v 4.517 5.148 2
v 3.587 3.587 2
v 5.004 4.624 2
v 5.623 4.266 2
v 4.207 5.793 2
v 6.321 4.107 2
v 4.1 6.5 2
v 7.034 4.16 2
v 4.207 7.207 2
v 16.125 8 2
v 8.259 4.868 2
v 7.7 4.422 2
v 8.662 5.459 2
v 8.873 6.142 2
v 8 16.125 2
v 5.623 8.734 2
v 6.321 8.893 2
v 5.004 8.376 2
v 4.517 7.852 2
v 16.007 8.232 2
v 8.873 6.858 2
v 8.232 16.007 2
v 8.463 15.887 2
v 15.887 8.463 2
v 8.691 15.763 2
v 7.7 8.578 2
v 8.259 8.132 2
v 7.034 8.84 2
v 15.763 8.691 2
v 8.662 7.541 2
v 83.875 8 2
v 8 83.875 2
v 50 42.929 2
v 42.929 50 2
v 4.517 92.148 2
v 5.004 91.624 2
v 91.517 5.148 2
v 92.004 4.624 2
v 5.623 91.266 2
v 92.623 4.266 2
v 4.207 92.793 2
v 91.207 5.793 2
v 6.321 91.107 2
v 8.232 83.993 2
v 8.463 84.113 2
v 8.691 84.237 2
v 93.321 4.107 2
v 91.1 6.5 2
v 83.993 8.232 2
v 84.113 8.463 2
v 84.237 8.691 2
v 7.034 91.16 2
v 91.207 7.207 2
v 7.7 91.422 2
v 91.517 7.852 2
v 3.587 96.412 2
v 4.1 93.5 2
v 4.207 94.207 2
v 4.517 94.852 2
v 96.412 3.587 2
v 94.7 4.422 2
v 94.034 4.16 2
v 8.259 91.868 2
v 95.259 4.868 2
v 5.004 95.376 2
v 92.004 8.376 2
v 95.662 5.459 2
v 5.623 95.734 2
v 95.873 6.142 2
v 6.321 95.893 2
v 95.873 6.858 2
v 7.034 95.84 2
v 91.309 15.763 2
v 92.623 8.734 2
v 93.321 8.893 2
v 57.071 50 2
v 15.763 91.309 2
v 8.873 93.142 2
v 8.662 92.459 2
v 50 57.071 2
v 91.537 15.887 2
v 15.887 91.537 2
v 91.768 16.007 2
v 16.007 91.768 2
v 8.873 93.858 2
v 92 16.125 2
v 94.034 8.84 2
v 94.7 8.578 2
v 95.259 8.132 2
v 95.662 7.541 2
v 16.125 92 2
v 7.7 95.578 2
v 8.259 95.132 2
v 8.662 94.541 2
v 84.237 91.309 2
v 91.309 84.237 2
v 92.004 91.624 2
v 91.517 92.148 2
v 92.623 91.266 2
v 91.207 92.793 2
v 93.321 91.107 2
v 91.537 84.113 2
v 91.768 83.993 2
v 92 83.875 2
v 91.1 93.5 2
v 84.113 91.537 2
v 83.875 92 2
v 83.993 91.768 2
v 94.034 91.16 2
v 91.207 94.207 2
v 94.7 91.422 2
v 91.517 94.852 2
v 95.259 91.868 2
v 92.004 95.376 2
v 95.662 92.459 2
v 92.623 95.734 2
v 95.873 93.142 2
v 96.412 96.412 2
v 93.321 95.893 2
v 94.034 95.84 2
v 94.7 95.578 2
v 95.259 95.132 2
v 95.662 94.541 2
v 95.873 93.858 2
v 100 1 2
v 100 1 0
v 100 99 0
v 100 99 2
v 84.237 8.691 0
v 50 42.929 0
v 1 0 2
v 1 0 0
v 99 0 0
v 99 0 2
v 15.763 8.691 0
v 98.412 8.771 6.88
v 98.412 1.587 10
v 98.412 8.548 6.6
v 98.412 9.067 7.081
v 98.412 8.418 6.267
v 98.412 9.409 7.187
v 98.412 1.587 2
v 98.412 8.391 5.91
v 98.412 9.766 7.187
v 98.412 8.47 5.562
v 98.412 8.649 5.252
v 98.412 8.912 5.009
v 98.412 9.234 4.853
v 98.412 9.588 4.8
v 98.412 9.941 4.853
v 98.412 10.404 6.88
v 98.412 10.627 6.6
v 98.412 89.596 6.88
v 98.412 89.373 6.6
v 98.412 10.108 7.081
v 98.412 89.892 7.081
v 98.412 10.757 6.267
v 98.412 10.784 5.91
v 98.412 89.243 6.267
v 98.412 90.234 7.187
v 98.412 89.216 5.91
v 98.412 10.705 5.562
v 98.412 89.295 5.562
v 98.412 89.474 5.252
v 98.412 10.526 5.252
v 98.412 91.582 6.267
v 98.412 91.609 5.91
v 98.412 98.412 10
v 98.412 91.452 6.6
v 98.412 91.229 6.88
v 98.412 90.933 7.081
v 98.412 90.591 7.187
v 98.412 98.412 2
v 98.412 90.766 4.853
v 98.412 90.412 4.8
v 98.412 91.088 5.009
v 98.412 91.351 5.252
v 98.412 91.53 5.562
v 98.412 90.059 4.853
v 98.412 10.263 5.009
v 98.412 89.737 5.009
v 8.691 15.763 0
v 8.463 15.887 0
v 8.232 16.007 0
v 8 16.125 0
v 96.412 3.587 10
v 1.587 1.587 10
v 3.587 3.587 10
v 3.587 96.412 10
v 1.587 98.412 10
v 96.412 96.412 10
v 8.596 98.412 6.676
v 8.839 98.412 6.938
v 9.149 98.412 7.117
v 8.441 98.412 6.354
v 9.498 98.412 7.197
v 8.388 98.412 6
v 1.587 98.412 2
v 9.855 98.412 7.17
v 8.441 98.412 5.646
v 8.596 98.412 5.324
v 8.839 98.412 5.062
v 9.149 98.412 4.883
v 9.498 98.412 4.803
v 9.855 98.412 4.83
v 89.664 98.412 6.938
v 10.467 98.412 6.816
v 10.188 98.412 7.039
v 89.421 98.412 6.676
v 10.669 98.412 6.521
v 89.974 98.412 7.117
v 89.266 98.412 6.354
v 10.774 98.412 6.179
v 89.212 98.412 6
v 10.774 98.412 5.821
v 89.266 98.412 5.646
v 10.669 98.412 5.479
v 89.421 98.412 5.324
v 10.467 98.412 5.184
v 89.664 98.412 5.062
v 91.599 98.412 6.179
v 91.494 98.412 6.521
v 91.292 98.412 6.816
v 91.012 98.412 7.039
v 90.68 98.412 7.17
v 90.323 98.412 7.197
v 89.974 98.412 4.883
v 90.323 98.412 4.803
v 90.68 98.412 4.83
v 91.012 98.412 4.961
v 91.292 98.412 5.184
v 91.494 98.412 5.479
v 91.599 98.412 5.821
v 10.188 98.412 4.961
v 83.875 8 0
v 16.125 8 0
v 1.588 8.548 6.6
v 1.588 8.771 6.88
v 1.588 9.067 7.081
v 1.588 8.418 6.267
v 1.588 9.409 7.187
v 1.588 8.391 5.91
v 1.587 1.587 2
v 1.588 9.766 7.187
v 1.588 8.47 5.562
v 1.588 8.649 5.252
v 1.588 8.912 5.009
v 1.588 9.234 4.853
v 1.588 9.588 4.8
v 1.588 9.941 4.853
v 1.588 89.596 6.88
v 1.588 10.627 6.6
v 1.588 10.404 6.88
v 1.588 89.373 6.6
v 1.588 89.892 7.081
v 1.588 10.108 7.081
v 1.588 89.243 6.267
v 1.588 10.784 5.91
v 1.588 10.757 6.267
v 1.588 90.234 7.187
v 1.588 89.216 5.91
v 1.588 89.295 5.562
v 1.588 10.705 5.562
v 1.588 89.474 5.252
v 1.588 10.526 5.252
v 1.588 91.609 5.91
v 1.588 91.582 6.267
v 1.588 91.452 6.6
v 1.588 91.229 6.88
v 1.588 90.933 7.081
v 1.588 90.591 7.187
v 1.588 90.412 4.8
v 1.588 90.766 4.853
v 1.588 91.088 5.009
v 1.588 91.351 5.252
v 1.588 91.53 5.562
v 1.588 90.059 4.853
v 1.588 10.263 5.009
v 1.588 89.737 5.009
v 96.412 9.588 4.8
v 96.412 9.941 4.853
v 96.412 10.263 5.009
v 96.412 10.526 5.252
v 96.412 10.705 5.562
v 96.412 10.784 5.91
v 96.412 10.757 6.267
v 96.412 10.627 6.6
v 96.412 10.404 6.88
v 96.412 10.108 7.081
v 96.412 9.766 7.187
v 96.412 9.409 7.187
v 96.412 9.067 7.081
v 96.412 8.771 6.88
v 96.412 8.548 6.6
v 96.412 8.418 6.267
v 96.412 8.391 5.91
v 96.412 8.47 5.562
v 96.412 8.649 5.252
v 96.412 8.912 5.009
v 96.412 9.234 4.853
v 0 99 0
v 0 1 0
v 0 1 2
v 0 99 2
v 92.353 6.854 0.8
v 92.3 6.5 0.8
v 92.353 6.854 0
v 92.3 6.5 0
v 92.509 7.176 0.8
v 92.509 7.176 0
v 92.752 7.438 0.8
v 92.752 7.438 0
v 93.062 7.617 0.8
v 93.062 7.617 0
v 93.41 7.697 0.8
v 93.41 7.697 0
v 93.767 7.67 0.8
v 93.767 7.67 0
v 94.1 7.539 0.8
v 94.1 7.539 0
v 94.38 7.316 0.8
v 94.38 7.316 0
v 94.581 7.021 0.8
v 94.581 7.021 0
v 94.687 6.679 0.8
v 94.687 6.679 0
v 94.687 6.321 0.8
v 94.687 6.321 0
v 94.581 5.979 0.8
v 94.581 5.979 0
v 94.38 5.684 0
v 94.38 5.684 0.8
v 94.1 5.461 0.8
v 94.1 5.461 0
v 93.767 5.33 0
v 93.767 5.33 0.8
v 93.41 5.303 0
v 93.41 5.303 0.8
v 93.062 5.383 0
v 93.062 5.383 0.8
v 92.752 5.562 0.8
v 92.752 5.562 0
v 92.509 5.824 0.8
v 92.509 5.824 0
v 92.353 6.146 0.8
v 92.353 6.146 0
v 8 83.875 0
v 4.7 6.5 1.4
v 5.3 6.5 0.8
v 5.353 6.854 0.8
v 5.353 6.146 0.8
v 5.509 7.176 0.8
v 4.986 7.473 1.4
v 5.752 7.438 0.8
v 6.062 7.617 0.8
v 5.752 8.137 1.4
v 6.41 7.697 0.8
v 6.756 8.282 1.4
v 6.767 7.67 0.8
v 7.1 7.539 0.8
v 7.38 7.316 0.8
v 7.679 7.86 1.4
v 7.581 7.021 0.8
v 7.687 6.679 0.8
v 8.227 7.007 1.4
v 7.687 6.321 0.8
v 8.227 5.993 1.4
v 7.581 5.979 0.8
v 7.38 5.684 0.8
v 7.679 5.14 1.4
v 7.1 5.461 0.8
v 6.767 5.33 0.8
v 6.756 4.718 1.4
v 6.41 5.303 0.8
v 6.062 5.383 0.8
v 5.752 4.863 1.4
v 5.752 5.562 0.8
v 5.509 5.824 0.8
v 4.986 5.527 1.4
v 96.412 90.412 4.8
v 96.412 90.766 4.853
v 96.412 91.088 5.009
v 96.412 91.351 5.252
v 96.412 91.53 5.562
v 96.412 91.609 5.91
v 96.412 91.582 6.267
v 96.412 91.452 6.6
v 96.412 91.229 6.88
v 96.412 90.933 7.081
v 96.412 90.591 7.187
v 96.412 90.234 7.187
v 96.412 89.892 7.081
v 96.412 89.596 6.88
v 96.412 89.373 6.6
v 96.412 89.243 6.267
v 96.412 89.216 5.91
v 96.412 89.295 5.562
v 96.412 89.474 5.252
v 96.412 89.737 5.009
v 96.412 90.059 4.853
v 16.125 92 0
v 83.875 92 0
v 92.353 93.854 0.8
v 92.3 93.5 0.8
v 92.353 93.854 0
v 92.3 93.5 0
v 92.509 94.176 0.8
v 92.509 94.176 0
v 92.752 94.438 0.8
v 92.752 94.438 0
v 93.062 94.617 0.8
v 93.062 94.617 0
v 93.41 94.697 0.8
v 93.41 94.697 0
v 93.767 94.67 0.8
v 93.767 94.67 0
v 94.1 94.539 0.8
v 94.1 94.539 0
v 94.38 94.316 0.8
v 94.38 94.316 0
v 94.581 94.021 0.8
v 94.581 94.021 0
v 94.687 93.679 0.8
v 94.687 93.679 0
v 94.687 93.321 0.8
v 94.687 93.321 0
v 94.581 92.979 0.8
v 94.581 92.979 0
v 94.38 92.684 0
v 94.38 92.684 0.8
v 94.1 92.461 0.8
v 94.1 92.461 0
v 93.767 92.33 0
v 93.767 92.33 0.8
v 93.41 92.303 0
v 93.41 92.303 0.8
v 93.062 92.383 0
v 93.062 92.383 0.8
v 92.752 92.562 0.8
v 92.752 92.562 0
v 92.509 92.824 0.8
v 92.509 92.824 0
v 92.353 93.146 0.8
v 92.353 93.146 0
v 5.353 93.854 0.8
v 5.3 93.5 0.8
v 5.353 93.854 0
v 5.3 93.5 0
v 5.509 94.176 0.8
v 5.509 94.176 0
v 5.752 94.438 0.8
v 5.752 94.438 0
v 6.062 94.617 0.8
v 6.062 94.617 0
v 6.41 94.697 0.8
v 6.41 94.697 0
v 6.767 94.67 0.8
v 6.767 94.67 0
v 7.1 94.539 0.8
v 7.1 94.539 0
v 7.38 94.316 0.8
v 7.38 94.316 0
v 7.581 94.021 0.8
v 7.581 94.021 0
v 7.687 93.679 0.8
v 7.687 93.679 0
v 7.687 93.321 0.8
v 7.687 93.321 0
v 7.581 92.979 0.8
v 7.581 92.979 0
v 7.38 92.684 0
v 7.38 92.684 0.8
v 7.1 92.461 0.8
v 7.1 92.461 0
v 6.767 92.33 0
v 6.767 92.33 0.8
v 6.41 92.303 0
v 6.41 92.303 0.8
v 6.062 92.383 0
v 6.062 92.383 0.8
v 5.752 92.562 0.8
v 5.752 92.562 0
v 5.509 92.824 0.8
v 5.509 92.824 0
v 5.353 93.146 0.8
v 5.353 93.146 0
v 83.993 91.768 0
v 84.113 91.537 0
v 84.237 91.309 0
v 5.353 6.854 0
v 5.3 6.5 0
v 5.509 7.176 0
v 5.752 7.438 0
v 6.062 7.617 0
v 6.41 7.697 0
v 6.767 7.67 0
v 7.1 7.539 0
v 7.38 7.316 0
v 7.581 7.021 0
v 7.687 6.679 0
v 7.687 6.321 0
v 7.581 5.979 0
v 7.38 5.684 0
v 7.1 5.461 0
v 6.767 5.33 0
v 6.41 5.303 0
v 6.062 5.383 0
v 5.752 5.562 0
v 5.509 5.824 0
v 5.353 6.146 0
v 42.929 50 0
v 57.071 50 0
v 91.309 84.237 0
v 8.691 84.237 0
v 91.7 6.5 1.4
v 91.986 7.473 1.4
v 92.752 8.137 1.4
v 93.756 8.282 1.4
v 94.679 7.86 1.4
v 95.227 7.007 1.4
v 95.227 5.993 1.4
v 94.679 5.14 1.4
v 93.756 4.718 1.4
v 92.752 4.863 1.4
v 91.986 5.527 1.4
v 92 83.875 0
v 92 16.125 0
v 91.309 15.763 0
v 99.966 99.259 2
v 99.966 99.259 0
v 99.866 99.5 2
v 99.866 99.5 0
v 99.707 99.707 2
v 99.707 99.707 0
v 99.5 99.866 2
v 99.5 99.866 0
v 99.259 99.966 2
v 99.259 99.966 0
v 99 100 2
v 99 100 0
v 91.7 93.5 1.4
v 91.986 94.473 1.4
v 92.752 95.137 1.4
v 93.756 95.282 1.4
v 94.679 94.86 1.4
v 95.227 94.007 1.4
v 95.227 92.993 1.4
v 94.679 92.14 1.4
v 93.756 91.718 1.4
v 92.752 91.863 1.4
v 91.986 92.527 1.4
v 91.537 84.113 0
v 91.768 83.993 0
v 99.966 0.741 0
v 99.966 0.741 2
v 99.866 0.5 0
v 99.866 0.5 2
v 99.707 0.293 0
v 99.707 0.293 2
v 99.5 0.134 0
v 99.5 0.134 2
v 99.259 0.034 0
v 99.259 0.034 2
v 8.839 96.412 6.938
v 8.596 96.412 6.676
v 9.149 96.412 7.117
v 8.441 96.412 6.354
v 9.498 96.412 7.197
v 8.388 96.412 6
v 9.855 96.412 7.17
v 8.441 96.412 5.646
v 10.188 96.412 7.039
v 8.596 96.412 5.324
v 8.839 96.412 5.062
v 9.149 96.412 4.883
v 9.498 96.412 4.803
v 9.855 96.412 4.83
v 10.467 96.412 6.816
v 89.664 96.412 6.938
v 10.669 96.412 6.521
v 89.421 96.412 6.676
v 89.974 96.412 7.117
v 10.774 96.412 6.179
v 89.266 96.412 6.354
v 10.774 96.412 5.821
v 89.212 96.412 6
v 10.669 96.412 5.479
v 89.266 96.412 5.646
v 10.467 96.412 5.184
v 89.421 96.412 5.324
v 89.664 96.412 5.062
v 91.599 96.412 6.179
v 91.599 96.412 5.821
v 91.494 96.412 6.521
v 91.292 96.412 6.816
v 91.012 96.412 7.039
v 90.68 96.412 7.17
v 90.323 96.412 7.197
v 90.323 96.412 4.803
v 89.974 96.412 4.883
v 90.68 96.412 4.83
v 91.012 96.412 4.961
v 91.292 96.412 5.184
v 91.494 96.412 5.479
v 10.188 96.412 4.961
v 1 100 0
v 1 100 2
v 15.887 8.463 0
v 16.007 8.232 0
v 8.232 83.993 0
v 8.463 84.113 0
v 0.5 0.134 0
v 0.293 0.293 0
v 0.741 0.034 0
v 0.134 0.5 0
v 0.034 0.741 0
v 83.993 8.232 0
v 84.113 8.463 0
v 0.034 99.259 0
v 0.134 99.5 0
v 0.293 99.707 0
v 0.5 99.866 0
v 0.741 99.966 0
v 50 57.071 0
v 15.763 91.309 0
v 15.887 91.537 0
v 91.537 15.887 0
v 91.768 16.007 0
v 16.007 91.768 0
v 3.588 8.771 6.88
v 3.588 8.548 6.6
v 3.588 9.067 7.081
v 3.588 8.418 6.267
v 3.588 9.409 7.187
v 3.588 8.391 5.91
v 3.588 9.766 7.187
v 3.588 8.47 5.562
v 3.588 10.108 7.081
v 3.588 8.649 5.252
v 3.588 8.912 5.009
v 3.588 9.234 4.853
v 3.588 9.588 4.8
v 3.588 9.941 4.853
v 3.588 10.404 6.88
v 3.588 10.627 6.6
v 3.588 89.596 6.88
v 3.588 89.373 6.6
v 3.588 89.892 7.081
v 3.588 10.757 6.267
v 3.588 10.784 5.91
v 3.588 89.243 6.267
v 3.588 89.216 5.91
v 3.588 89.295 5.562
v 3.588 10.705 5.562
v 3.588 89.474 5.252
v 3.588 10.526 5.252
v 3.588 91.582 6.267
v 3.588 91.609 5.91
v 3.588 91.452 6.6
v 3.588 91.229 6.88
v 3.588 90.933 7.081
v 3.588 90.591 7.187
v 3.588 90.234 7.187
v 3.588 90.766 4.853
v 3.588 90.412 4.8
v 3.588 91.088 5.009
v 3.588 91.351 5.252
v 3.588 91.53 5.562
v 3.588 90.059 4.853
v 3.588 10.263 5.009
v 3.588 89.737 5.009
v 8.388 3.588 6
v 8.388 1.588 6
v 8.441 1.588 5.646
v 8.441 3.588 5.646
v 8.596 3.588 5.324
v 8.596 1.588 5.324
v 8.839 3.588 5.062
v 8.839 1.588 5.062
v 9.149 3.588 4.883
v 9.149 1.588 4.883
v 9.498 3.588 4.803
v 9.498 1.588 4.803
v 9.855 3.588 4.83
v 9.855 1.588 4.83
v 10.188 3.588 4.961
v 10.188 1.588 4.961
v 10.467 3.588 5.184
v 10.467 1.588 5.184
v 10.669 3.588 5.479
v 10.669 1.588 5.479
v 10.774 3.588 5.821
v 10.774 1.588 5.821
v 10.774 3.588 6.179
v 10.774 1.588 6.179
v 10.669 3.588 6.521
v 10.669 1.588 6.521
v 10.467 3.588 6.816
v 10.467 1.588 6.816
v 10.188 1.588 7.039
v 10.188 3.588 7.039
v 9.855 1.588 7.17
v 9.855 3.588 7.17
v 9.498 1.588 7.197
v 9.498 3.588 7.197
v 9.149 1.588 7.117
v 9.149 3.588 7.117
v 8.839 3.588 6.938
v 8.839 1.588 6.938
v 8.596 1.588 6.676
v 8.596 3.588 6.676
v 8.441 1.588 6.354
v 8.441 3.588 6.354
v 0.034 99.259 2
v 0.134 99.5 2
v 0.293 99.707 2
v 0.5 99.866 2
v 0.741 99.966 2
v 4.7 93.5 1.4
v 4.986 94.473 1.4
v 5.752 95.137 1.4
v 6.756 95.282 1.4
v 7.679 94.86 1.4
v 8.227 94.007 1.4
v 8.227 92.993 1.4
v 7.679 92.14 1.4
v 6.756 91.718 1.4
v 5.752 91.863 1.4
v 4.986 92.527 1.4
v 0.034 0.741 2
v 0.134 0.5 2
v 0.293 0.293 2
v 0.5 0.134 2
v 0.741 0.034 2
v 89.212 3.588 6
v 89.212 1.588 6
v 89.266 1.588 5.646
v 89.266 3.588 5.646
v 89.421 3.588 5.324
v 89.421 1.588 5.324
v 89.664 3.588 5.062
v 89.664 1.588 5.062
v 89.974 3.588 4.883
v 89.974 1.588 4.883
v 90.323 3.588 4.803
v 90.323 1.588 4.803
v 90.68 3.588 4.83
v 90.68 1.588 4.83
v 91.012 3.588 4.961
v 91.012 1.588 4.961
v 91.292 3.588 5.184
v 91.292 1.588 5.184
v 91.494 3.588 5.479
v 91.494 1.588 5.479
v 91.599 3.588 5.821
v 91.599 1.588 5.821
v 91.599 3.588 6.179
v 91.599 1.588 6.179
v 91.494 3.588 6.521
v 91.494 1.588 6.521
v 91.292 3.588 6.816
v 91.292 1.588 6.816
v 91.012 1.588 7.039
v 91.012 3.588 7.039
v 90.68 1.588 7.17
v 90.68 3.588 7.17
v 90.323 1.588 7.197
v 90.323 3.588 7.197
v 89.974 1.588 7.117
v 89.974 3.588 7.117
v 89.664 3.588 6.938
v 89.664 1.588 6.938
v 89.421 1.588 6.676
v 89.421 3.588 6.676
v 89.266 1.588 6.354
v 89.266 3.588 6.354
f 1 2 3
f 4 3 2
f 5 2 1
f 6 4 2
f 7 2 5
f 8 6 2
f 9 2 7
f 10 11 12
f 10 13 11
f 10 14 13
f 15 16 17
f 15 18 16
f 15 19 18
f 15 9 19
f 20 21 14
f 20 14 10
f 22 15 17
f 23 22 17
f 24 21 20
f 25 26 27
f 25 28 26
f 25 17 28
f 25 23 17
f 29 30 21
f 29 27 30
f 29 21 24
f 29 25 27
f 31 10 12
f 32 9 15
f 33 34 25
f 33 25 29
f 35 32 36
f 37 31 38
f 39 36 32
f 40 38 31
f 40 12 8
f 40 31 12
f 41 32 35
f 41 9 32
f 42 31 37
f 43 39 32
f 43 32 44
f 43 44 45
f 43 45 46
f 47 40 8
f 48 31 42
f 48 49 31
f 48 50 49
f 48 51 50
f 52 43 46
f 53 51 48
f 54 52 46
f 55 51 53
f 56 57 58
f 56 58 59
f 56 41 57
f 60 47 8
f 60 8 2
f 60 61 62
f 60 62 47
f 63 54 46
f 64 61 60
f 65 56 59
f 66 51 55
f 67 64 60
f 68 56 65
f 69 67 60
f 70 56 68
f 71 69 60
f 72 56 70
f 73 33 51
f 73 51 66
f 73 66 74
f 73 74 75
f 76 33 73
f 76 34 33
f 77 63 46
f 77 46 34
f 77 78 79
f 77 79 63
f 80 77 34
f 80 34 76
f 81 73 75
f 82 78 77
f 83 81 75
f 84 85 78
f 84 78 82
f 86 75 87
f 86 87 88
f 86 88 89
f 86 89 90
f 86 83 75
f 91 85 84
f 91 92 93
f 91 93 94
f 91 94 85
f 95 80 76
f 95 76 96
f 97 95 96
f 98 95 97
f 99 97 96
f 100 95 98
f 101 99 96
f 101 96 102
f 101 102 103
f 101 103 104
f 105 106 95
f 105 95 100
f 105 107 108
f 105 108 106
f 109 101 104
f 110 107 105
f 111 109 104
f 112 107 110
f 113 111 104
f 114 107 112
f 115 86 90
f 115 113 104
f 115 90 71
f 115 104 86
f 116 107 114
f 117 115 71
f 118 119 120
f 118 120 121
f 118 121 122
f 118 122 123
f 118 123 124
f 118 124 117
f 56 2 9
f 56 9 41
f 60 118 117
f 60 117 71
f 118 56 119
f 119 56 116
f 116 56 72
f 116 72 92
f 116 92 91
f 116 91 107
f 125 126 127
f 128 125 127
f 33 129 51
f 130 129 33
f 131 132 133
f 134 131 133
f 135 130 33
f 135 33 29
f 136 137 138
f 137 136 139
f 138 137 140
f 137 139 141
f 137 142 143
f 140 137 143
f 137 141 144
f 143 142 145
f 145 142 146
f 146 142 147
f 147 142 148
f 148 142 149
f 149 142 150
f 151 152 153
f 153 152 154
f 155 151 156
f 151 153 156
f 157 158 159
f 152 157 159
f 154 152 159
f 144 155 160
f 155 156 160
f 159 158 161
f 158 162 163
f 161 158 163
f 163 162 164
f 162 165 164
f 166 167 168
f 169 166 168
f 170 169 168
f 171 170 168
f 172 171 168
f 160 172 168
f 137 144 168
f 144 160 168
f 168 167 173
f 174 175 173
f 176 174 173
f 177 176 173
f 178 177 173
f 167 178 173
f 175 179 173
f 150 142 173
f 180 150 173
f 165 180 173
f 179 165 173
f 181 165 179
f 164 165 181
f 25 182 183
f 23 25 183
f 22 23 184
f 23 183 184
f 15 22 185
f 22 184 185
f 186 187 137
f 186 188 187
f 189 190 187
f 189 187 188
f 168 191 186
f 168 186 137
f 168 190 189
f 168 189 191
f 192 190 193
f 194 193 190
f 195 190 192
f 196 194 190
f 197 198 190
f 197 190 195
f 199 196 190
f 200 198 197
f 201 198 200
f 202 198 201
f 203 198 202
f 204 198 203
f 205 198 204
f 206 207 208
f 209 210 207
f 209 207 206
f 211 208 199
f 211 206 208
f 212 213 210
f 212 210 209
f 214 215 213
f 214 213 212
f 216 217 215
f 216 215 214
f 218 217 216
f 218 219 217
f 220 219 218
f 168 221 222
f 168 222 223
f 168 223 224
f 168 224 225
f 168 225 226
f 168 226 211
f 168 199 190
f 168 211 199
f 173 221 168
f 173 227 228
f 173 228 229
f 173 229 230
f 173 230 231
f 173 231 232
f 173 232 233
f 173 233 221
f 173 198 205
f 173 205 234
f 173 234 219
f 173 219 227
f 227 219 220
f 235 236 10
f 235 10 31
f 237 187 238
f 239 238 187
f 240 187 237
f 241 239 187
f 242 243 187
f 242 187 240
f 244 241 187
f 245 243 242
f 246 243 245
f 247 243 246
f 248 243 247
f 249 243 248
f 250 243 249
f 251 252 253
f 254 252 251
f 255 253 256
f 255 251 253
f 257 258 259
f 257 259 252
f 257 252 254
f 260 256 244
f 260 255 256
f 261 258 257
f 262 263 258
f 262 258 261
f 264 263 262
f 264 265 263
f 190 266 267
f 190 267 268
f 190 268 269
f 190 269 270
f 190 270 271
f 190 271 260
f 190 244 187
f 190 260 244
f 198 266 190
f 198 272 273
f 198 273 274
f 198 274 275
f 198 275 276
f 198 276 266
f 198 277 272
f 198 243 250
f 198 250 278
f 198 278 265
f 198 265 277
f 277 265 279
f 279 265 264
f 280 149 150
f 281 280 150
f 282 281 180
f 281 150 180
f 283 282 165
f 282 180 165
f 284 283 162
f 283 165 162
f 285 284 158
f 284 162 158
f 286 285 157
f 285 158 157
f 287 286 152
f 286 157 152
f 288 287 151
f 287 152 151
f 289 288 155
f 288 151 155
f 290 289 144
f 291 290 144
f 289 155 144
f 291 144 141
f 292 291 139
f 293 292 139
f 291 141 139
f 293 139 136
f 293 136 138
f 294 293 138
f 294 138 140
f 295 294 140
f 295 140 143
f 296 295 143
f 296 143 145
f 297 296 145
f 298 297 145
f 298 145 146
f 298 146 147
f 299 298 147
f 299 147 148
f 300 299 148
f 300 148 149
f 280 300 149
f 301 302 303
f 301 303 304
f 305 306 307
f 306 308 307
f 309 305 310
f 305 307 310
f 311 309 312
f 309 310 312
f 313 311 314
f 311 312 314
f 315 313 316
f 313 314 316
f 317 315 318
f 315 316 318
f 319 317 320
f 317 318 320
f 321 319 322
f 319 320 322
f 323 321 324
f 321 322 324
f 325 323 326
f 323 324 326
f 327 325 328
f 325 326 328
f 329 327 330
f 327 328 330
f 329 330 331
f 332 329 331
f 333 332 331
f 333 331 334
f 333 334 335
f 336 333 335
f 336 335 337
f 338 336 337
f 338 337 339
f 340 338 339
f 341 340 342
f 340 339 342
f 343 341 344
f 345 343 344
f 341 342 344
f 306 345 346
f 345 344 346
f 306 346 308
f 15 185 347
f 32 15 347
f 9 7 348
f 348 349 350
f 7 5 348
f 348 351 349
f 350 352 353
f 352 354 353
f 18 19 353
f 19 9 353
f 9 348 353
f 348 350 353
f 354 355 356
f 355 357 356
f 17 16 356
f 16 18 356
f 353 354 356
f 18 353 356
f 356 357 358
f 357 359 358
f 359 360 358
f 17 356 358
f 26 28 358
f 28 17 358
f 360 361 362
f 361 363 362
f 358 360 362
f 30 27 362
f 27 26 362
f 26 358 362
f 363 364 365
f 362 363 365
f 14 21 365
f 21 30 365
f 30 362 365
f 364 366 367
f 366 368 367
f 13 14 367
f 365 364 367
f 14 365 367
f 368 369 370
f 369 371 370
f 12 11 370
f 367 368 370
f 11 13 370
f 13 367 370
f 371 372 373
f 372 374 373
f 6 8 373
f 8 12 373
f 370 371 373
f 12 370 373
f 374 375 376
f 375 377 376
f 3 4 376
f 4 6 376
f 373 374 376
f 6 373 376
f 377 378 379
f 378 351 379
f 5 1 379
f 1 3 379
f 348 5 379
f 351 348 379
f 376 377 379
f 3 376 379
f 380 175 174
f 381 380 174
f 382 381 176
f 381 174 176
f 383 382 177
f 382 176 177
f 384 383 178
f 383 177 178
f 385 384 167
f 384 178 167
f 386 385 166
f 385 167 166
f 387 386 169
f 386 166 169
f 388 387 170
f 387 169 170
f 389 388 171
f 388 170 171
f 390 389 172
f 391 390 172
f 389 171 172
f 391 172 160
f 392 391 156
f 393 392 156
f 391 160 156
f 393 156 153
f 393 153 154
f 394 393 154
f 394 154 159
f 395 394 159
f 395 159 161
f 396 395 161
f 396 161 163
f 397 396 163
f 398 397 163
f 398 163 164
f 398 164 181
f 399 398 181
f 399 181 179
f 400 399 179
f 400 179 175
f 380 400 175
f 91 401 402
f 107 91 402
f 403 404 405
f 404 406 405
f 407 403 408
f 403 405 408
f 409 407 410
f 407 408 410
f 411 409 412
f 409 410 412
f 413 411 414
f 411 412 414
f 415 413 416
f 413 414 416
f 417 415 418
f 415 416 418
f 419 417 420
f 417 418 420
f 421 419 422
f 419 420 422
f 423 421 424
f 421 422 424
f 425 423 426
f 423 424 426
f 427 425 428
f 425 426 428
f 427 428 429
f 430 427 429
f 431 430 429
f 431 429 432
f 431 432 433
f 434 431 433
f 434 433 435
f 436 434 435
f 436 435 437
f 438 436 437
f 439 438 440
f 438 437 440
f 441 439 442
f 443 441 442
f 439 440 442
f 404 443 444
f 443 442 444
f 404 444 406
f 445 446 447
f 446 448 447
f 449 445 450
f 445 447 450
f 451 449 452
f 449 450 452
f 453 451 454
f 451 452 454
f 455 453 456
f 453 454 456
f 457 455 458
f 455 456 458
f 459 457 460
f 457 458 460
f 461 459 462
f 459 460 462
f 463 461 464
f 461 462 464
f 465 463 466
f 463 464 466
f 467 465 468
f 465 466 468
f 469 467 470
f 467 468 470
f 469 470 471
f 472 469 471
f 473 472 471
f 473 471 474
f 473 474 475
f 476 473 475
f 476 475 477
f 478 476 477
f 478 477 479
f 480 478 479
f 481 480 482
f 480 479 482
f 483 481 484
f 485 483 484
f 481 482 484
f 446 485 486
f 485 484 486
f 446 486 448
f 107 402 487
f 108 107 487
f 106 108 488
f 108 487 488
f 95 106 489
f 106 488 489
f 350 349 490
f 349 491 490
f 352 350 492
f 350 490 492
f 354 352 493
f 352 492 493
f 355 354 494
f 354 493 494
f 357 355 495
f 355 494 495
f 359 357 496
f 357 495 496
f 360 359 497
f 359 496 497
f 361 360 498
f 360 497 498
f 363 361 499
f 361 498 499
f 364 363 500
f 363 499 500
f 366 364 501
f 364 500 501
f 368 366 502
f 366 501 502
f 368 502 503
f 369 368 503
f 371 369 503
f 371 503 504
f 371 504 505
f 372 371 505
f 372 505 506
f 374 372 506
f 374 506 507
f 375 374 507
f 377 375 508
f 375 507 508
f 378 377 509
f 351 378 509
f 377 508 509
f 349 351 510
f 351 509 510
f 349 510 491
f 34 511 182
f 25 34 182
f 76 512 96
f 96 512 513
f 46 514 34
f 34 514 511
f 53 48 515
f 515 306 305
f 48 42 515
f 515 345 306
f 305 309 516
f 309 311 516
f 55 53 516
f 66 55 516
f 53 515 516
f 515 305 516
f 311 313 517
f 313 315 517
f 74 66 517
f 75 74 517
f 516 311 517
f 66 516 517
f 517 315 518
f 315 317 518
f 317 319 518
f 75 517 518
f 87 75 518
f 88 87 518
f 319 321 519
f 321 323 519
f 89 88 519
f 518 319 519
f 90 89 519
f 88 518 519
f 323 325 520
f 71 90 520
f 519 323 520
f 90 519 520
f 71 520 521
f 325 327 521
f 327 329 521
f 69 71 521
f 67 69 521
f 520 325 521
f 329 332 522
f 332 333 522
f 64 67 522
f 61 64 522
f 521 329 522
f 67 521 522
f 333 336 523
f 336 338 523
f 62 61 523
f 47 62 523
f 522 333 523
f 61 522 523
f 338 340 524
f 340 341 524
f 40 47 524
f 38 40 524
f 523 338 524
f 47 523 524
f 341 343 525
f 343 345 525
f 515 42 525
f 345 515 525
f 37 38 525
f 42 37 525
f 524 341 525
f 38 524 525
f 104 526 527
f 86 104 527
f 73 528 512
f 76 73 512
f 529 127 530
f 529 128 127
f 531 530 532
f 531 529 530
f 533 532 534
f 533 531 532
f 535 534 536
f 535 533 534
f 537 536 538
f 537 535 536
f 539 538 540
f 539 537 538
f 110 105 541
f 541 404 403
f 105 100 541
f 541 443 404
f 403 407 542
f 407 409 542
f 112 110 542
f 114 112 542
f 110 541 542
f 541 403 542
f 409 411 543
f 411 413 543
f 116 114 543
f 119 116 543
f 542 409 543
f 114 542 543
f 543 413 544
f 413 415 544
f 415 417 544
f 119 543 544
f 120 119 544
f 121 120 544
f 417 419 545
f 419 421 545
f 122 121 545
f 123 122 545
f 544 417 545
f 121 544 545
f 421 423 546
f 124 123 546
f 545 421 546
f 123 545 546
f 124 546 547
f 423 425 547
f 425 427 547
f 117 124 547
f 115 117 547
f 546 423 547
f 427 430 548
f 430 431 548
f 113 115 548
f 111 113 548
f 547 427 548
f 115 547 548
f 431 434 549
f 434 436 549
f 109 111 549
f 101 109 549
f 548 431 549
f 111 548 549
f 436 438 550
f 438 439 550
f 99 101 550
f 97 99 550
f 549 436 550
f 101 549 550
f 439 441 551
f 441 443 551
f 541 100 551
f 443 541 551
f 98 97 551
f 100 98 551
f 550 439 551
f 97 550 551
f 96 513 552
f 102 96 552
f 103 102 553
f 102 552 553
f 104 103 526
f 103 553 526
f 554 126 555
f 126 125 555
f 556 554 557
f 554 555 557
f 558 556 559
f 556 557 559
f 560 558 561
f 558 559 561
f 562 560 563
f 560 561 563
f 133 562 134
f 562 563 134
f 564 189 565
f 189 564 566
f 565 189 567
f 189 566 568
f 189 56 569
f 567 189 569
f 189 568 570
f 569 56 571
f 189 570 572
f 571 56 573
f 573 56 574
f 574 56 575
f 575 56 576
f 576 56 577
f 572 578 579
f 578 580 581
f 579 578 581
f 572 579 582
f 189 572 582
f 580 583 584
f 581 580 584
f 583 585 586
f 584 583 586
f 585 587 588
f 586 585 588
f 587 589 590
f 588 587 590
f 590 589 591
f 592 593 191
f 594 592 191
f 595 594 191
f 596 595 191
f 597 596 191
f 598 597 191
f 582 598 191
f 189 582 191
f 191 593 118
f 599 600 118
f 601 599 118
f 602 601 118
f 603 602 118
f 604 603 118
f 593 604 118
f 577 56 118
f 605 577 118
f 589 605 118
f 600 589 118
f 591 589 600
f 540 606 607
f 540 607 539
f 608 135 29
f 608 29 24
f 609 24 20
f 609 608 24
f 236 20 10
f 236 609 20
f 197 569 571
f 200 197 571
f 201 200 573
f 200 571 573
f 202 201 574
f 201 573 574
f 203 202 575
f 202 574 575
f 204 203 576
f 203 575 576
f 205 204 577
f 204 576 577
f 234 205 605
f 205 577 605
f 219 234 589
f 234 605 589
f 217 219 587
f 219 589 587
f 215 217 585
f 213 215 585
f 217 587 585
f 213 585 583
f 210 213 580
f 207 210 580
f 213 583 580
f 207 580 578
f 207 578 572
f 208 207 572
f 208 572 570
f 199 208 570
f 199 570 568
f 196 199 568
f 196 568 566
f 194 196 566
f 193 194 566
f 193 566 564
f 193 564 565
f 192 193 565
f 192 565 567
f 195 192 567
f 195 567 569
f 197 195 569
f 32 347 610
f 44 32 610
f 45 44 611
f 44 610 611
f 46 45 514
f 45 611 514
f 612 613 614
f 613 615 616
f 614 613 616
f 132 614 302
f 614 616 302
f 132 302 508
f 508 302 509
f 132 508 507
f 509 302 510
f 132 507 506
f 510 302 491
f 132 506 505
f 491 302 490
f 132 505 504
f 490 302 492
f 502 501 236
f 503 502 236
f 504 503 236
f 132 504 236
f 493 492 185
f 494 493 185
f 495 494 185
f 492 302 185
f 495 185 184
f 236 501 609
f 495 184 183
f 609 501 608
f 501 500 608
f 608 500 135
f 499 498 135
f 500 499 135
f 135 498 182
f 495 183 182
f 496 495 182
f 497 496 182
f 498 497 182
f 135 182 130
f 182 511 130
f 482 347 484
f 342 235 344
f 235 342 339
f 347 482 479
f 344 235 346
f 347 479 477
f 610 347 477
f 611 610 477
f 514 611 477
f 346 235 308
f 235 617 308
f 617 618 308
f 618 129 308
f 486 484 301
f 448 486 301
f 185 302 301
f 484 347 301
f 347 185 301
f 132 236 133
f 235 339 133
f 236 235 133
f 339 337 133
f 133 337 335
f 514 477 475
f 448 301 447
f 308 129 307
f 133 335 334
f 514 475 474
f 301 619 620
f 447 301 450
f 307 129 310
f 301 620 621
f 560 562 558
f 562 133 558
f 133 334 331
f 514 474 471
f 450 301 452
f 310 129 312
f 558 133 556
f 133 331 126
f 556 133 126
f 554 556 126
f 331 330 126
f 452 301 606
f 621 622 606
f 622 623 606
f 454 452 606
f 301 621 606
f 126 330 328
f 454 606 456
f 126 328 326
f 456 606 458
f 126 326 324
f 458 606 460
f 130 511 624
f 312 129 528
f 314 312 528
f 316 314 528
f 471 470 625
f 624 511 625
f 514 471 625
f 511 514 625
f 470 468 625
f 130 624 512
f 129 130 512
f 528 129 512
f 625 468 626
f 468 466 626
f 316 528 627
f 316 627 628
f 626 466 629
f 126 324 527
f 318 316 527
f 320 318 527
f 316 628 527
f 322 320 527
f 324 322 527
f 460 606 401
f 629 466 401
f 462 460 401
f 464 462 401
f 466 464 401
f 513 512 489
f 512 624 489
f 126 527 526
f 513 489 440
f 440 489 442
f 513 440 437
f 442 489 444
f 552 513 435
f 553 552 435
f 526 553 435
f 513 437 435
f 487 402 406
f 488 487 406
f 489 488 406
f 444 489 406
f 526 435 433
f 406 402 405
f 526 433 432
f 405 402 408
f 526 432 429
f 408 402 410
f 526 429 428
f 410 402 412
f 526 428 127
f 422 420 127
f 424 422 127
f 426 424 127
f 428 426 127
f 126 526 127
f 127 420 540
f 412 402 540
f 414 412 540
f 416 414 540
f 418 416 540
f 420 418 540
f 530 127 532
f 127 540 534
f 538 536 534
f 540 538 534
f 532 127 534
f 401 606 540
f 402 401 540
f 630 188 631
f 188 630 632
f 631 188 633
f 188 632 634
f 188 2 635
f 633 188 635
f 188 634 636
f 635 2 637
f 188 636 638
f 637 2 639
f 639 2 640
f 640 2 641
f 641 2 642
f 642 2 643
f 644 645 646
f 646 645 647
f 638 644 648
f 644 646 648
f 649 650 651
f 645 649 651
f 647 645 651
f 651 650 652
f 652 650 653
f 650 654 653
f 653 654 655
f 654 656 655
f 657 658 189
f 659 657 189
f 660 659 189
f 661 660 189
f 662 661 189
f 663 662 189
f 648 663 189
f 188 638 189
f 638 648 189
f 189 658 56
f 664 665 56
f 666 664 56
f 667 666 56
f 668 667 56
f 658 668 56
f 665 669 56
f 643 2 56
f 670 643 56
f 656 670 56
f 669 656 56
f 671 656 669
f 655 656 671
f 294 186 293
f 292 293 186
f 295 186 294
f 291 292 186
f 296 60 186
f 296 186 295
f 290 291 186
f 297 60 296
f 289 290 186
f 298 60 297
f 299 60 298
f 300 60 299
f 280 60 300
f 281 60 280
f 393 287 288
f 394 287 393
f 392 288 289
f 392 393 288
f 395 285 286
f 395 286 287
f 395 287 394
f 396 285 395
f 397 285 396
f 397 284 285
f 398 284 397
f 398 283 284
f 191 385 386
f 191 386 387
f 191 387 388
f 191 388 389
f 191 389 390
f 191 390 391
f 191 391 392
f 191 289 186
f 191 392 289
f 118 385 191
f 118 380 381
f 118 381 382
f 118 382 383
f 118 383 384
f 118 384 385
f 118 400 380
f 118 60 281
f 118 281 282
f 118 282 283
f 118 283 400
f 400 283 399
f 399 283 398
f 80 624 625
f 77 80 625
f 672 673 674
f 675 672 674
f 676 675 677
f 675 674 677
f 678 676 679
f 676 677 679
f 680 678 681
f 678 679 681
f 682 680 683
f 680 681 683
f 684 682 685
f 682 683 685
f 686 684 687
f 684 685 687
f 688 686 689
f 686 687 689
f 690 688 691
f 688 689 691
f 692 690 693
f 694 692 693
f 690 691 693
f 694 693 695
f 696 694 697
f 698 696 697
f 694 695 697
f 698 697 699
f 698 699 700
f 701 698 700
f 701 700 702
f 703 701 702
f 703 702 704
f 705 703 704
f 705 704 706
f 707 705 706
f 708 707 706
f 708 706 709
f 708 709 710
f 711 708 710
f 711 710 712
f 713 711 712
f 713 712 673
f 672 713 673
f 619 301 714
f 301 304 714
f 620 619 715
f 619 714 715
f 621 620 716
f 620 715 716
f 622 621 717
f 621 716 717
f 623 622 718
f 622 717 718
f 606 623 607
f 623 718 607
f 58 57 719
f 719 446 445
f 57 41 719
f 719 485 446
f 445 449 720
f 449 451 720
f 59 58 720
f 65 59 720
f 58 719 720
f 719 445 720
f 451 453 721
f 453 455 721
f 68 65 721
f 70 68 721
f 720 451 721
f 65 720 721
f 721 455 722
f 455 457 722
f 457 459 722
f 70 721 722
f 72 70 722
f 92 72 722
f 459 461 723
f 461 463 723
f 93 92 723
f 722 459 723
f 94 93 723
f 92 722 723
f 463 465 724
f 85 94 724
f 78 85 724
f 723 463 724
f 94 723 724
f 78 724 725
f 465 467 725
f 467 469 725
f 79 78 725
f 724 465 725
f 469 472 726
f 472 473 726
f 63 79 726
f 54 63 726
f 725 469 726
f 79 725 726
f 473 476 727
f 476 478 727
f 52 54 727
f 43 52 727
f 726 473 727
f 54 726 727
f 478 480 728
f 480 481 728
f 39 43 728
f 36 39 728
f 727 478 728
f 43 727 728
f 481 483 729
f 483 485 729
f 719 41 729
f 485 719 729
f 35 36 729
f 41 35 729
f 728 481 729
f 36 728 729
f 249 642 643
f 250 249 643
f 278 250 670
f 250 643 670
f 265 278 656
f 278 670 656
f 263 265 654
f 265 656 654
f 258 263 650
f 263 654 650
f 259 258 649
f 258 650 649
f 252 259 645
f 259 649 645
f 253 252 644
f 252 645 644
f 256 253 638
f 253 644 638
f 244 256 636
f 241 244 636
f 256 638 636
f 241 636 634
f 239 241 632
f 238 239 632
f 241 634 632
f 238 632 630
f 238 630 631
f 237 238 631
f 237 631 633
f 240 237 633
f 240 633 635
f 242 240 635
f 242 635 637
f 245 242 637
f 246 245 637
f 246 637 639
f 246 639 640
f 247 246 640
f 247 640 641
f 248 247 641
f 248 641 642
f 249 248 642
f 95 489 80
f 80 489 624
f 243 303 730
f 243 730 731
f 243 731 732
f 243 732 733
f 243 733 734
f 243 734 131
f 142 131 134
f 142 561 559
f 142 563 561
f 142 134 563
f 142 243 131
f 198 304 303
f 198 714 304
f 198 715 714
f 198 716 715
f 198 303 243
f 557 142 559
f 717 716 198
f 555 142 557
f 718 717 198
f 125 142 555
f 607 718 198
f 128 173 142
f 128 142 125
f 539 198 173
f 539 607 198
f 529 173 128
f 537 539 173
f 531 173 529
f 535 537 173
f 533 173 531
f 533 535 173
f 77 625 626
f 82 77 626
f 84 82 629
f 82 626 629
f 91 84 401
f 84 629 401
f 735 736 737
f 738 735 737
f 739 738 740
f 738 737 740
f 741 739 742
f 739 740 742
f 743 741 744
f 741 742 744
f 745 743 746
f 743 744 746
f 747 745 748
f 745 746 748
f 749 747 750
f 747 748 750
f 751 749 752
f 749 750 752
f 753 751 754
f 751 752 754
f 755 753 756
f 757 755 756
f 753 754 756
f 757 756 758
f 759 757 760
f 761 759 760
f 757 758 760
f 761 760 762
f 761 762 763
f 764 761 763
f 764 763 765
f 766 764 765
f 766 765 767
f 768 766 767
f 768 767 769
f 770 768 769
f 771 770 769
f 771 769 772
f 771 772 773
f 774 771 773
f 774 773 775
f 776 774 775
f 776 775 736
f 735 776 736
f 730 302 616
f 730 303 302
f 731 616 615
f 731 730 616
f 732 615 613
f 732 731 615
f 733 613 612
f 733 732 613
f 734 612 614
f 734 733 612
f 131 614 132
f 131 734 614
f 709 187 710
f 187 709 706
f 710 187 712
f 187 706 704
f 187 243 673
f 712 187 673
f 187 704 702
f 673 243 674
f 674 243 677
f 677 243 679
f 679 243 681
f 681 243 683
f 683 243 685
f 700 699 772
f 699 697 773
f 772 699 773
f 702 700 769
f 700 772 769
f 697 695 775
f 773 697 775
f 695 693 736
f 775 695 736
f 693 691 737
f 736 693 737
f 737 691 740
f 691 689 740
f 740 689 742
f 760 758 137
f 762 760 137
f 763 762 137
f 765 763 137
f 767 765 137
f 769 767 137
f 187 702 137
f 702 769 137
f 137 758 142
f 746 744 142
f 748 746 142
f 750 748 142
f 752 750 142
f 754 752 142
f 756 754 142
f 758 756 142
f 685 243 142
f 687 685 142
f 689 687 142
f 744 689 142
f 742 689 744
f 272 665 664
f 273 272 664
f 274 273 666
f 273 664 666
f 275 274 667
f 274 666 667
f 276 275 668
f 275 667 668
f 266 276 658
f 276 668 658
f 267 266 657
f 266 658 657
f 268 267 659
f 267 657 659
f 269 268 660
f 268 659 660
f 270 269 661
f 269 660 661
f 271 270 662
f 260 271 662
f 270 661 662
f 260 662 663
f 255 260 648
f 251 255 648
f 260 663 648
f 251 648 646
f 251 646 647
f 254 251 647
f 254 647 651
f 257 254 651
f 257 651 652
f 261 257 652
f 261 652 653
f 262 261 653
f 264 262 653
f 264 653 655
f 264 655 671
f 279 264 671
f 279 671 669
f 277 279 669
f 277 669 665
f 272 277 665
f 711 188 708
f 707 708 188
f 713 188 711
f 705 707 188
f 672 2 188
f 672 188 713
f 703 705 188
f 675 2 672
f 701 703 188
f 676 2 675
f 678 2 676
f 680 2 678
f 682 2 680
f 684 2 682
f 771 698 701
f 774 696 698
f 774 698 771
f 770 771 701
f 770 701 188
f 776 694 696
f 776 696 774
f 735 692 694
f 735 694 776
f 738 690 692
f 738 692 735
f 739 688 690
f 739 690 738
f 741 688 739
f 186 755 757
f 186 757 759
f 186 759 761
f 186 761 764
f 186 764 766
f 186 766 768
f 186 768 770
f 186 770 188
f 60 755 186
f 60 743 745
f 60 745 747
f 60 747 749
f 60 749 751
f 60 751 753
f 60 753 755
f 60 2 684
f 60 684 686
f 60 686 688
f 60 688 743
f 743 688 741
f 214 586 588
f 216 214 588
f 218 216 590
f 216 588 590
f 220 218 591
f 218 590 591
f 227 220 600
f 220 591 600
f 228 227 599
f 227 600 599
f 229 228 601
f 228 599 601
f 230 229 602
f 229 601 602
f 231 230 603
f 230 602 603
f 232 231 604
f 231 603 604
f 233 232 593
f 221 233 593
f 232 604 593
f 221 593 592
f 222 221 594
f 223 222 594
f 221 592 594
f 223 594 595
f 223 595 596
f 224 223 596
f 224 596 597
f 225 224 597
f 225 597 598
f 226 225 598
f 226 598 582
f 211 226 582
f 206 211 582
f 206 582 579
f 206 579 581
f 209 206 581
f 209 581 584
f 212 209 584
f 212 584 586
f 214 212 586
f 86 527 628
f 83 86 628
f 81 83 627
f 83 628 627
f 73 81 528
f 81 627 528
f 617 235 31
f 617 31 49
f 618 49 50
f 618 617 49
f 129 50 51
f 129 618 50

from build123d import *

# Parameters (mm, degrees)
SKETCH1_W                                       = 100
SKETCH1_H                                       = 100
BOSS_EXTRUDE1_DEPTH                             = 2
SKETCH2_W                                       = 96.825
SKETCH2_H                                       = 96.825
SKETCH2_W_2                                     = 92.825
SKETCH2_H_2                                     = 92.825
BOSS_EXTRUDE2_DEPTH                             = 8
CSK_FOR_M2_FLAT_HEAD_MACHINE_SCREW1_D           = 2.4
CSK_FOR_M2_FLAT_HEAD_MACHINE_SCREW1_DEPTH       = 311.5
CSK_FOR_M2_FLAT_HEAD_MACHINE_SCREW1_CSINK_D     = 4.8
CSK_FOR_M2_FLAT_HEAD_MACHINE_SCREW1_CSINK_ANGLE = 90
CSK_FOR_M2_FLAT_HEAD_MACHINE_SCREW1_TIP         = 0.721032743
FILLET1_R                                       = 1
M2_CLEARANCE_HOLE1_D                            = 2.4
M2_CLEARANCE_HOLE2_D                            = 2.4


with BuildPart() as part:
    # Sketch1 → Boss-Extrude1 (new body)
    with BuildSketch(Plane.XY):
        with Locations((50, 50)):
            Rectangle(SKETCH1_W, SKETCH1_H)
        with BuildLine():
            Line((8, 16.124515497), (8, 83.875484503))
            ThreePointArc((8, 83.875484503), (8.347704775, 84.052717317), (8.691485355, 84.237446833))
            Line((8.691485355, 84.237446833), (42.928932188, 50))
            Line((42.928932188, 50), (8.691485355, 15.762553167))
            ThreePointArc((8.691485355, 15.762553167), (8.347704775, 15.947282683), (8, 16.124515497))
        make_face(mode=Mode.SUBTRACT)
        with BuildLine():
            Line((16.124515497, 92), (83.875484503, 92))
            ThreePointArc((83.875484503, 92), (84.052717317, 91.652295225), (84.237446833, 91.308514645))
            Line((84.237446833, 91.308514645), (50, 57.071067812))
            Line((50, 57.071067812), (15.762553167, 91.308514645))
            ThreePointArc((15.762553167, 91.308514645), (15.947282683, 91.652295225), (16.124515497, 92))
        make_face(mode=Mode.SUBTRACT)
        with BuildLine():
            Line((92, 83.875484503), (92, 16.124515497))
            ThreePointArc((92, 16.124515497), (91.652295225, 15.947282683), (91.308514645, 15.762553167))
            Line((91.308514645, 15.762553167), (57.071067812, 50))
            Line((57.071067812, 50), (91.308514645, 84.237446833))
            ThreePointArc((91.308514645, 84.237446833), (91.652295225, 84.052717317), (92, 83.875484503))
        make_face(mode=Mode.SUBTRACT)
        with BuildLine():
            Line((16.124515497, 8), (83.875484503, 8))
            ThreePointArc((83.875484503, 8), (84.052717317, 8.347704775), (84.237446833, 8.691485355))
            Line((84.237446833, 8.691485355), (50, 42.928932188))
            Line((50, 42.928932188), (15.762553167, 8.691485355))
            ThreePointArc((15.762553167, 8.691485355), (15.947282683, 8.347704775), (16.124515497, 8))
        make_face(mode=Mode.SUBTRACT)
    extrude(amount=BOSS_EXTRUDE1_DEPTH)

    # Sketch2 → Boss-Extrude2 (add)
    with BuildSketch(Plane.XY.offset(2)):
        with Locations((50, 50)):
            Rectangle(SKETCH2_W, SKETCH2_H)
        with Locations((50, 50)):
            Rectangle(SKETCH2_W_2, SKETCH2_H_2, mode=Mode.SUBTRACT)
    extrude(amount=BOSS_EXTRUDE2_DEPTH)

    # CSK for M2 Flat Head Machine Screw1
    with Locations(Plane.XY.offset(2)):
        with Locations((6.5, 93.5), (93.5, 93.5), (93.5, 6.5), (6.5, 6.5)):
            CounterSinkHole(CSK_FOR_M2_FLAT_HEAD_MACHINE_SCREW1_D / 2, CSK_FOR_M2_FLAT_HEAD_MACHINE_SCREW1_CSINK_D / 2, depth=CSK_FOR_M2_FLAT_HEAD_MACHINE_SCREW1_DEPTH, counter_sink_angle=CSK_FOR_M2_FLAT_HEAD_MACHINE_SCREW1_CSINK_ANGLE)
            with Locations((0, 0, -(CSK_FOR_M2_FLAT_HEAD_MACHINE_SCREW1_DEPTH + CSK_FOR_M2_FLAT_HEAD_MACHINE_SCREW1_TIP / 2))):  # 118° drill point
                Cone(0, CSK_FOR_M2_FLAT_HEAD_MACHINE_SCREW1_D / 2, CSK_FOR_M2_FLAT_HEAD_MACHINE_SCREW1_TIP, mode=Mode.SUBTRACT)

    # Fillet1
    fillet1_edges = [part.edges().sort_by_distance(p)[0] for p in [
        (0, 100, 1),
        (100, 100, 1),
        (100, 0, 1),
        (0, 0, 1),
    ]]
    fillet(fillet1_edges, radius=FILLET1_R)

    # M2 Clearance Hole1 (through all)
    with Locations(Plane.ZY.offset(-1.5875)):
        with Locations((6, 90.4125), (6, 9.5875)):
            Hole(M2_CLEARANCE_HOLE1_D / 2)

    # M2 Clearance Hole2 (through all)
    with Locations(Plane(origin=(0, 98.4125, 0), x_dir=(1, 0, 0), z_dir=(0, 1, 0))):
        with Locations((9.5875, -6), (90.4125, -6)):
            Hole(M2_CLEARANCE_HOLE2_D / 2)


solid = part.part
